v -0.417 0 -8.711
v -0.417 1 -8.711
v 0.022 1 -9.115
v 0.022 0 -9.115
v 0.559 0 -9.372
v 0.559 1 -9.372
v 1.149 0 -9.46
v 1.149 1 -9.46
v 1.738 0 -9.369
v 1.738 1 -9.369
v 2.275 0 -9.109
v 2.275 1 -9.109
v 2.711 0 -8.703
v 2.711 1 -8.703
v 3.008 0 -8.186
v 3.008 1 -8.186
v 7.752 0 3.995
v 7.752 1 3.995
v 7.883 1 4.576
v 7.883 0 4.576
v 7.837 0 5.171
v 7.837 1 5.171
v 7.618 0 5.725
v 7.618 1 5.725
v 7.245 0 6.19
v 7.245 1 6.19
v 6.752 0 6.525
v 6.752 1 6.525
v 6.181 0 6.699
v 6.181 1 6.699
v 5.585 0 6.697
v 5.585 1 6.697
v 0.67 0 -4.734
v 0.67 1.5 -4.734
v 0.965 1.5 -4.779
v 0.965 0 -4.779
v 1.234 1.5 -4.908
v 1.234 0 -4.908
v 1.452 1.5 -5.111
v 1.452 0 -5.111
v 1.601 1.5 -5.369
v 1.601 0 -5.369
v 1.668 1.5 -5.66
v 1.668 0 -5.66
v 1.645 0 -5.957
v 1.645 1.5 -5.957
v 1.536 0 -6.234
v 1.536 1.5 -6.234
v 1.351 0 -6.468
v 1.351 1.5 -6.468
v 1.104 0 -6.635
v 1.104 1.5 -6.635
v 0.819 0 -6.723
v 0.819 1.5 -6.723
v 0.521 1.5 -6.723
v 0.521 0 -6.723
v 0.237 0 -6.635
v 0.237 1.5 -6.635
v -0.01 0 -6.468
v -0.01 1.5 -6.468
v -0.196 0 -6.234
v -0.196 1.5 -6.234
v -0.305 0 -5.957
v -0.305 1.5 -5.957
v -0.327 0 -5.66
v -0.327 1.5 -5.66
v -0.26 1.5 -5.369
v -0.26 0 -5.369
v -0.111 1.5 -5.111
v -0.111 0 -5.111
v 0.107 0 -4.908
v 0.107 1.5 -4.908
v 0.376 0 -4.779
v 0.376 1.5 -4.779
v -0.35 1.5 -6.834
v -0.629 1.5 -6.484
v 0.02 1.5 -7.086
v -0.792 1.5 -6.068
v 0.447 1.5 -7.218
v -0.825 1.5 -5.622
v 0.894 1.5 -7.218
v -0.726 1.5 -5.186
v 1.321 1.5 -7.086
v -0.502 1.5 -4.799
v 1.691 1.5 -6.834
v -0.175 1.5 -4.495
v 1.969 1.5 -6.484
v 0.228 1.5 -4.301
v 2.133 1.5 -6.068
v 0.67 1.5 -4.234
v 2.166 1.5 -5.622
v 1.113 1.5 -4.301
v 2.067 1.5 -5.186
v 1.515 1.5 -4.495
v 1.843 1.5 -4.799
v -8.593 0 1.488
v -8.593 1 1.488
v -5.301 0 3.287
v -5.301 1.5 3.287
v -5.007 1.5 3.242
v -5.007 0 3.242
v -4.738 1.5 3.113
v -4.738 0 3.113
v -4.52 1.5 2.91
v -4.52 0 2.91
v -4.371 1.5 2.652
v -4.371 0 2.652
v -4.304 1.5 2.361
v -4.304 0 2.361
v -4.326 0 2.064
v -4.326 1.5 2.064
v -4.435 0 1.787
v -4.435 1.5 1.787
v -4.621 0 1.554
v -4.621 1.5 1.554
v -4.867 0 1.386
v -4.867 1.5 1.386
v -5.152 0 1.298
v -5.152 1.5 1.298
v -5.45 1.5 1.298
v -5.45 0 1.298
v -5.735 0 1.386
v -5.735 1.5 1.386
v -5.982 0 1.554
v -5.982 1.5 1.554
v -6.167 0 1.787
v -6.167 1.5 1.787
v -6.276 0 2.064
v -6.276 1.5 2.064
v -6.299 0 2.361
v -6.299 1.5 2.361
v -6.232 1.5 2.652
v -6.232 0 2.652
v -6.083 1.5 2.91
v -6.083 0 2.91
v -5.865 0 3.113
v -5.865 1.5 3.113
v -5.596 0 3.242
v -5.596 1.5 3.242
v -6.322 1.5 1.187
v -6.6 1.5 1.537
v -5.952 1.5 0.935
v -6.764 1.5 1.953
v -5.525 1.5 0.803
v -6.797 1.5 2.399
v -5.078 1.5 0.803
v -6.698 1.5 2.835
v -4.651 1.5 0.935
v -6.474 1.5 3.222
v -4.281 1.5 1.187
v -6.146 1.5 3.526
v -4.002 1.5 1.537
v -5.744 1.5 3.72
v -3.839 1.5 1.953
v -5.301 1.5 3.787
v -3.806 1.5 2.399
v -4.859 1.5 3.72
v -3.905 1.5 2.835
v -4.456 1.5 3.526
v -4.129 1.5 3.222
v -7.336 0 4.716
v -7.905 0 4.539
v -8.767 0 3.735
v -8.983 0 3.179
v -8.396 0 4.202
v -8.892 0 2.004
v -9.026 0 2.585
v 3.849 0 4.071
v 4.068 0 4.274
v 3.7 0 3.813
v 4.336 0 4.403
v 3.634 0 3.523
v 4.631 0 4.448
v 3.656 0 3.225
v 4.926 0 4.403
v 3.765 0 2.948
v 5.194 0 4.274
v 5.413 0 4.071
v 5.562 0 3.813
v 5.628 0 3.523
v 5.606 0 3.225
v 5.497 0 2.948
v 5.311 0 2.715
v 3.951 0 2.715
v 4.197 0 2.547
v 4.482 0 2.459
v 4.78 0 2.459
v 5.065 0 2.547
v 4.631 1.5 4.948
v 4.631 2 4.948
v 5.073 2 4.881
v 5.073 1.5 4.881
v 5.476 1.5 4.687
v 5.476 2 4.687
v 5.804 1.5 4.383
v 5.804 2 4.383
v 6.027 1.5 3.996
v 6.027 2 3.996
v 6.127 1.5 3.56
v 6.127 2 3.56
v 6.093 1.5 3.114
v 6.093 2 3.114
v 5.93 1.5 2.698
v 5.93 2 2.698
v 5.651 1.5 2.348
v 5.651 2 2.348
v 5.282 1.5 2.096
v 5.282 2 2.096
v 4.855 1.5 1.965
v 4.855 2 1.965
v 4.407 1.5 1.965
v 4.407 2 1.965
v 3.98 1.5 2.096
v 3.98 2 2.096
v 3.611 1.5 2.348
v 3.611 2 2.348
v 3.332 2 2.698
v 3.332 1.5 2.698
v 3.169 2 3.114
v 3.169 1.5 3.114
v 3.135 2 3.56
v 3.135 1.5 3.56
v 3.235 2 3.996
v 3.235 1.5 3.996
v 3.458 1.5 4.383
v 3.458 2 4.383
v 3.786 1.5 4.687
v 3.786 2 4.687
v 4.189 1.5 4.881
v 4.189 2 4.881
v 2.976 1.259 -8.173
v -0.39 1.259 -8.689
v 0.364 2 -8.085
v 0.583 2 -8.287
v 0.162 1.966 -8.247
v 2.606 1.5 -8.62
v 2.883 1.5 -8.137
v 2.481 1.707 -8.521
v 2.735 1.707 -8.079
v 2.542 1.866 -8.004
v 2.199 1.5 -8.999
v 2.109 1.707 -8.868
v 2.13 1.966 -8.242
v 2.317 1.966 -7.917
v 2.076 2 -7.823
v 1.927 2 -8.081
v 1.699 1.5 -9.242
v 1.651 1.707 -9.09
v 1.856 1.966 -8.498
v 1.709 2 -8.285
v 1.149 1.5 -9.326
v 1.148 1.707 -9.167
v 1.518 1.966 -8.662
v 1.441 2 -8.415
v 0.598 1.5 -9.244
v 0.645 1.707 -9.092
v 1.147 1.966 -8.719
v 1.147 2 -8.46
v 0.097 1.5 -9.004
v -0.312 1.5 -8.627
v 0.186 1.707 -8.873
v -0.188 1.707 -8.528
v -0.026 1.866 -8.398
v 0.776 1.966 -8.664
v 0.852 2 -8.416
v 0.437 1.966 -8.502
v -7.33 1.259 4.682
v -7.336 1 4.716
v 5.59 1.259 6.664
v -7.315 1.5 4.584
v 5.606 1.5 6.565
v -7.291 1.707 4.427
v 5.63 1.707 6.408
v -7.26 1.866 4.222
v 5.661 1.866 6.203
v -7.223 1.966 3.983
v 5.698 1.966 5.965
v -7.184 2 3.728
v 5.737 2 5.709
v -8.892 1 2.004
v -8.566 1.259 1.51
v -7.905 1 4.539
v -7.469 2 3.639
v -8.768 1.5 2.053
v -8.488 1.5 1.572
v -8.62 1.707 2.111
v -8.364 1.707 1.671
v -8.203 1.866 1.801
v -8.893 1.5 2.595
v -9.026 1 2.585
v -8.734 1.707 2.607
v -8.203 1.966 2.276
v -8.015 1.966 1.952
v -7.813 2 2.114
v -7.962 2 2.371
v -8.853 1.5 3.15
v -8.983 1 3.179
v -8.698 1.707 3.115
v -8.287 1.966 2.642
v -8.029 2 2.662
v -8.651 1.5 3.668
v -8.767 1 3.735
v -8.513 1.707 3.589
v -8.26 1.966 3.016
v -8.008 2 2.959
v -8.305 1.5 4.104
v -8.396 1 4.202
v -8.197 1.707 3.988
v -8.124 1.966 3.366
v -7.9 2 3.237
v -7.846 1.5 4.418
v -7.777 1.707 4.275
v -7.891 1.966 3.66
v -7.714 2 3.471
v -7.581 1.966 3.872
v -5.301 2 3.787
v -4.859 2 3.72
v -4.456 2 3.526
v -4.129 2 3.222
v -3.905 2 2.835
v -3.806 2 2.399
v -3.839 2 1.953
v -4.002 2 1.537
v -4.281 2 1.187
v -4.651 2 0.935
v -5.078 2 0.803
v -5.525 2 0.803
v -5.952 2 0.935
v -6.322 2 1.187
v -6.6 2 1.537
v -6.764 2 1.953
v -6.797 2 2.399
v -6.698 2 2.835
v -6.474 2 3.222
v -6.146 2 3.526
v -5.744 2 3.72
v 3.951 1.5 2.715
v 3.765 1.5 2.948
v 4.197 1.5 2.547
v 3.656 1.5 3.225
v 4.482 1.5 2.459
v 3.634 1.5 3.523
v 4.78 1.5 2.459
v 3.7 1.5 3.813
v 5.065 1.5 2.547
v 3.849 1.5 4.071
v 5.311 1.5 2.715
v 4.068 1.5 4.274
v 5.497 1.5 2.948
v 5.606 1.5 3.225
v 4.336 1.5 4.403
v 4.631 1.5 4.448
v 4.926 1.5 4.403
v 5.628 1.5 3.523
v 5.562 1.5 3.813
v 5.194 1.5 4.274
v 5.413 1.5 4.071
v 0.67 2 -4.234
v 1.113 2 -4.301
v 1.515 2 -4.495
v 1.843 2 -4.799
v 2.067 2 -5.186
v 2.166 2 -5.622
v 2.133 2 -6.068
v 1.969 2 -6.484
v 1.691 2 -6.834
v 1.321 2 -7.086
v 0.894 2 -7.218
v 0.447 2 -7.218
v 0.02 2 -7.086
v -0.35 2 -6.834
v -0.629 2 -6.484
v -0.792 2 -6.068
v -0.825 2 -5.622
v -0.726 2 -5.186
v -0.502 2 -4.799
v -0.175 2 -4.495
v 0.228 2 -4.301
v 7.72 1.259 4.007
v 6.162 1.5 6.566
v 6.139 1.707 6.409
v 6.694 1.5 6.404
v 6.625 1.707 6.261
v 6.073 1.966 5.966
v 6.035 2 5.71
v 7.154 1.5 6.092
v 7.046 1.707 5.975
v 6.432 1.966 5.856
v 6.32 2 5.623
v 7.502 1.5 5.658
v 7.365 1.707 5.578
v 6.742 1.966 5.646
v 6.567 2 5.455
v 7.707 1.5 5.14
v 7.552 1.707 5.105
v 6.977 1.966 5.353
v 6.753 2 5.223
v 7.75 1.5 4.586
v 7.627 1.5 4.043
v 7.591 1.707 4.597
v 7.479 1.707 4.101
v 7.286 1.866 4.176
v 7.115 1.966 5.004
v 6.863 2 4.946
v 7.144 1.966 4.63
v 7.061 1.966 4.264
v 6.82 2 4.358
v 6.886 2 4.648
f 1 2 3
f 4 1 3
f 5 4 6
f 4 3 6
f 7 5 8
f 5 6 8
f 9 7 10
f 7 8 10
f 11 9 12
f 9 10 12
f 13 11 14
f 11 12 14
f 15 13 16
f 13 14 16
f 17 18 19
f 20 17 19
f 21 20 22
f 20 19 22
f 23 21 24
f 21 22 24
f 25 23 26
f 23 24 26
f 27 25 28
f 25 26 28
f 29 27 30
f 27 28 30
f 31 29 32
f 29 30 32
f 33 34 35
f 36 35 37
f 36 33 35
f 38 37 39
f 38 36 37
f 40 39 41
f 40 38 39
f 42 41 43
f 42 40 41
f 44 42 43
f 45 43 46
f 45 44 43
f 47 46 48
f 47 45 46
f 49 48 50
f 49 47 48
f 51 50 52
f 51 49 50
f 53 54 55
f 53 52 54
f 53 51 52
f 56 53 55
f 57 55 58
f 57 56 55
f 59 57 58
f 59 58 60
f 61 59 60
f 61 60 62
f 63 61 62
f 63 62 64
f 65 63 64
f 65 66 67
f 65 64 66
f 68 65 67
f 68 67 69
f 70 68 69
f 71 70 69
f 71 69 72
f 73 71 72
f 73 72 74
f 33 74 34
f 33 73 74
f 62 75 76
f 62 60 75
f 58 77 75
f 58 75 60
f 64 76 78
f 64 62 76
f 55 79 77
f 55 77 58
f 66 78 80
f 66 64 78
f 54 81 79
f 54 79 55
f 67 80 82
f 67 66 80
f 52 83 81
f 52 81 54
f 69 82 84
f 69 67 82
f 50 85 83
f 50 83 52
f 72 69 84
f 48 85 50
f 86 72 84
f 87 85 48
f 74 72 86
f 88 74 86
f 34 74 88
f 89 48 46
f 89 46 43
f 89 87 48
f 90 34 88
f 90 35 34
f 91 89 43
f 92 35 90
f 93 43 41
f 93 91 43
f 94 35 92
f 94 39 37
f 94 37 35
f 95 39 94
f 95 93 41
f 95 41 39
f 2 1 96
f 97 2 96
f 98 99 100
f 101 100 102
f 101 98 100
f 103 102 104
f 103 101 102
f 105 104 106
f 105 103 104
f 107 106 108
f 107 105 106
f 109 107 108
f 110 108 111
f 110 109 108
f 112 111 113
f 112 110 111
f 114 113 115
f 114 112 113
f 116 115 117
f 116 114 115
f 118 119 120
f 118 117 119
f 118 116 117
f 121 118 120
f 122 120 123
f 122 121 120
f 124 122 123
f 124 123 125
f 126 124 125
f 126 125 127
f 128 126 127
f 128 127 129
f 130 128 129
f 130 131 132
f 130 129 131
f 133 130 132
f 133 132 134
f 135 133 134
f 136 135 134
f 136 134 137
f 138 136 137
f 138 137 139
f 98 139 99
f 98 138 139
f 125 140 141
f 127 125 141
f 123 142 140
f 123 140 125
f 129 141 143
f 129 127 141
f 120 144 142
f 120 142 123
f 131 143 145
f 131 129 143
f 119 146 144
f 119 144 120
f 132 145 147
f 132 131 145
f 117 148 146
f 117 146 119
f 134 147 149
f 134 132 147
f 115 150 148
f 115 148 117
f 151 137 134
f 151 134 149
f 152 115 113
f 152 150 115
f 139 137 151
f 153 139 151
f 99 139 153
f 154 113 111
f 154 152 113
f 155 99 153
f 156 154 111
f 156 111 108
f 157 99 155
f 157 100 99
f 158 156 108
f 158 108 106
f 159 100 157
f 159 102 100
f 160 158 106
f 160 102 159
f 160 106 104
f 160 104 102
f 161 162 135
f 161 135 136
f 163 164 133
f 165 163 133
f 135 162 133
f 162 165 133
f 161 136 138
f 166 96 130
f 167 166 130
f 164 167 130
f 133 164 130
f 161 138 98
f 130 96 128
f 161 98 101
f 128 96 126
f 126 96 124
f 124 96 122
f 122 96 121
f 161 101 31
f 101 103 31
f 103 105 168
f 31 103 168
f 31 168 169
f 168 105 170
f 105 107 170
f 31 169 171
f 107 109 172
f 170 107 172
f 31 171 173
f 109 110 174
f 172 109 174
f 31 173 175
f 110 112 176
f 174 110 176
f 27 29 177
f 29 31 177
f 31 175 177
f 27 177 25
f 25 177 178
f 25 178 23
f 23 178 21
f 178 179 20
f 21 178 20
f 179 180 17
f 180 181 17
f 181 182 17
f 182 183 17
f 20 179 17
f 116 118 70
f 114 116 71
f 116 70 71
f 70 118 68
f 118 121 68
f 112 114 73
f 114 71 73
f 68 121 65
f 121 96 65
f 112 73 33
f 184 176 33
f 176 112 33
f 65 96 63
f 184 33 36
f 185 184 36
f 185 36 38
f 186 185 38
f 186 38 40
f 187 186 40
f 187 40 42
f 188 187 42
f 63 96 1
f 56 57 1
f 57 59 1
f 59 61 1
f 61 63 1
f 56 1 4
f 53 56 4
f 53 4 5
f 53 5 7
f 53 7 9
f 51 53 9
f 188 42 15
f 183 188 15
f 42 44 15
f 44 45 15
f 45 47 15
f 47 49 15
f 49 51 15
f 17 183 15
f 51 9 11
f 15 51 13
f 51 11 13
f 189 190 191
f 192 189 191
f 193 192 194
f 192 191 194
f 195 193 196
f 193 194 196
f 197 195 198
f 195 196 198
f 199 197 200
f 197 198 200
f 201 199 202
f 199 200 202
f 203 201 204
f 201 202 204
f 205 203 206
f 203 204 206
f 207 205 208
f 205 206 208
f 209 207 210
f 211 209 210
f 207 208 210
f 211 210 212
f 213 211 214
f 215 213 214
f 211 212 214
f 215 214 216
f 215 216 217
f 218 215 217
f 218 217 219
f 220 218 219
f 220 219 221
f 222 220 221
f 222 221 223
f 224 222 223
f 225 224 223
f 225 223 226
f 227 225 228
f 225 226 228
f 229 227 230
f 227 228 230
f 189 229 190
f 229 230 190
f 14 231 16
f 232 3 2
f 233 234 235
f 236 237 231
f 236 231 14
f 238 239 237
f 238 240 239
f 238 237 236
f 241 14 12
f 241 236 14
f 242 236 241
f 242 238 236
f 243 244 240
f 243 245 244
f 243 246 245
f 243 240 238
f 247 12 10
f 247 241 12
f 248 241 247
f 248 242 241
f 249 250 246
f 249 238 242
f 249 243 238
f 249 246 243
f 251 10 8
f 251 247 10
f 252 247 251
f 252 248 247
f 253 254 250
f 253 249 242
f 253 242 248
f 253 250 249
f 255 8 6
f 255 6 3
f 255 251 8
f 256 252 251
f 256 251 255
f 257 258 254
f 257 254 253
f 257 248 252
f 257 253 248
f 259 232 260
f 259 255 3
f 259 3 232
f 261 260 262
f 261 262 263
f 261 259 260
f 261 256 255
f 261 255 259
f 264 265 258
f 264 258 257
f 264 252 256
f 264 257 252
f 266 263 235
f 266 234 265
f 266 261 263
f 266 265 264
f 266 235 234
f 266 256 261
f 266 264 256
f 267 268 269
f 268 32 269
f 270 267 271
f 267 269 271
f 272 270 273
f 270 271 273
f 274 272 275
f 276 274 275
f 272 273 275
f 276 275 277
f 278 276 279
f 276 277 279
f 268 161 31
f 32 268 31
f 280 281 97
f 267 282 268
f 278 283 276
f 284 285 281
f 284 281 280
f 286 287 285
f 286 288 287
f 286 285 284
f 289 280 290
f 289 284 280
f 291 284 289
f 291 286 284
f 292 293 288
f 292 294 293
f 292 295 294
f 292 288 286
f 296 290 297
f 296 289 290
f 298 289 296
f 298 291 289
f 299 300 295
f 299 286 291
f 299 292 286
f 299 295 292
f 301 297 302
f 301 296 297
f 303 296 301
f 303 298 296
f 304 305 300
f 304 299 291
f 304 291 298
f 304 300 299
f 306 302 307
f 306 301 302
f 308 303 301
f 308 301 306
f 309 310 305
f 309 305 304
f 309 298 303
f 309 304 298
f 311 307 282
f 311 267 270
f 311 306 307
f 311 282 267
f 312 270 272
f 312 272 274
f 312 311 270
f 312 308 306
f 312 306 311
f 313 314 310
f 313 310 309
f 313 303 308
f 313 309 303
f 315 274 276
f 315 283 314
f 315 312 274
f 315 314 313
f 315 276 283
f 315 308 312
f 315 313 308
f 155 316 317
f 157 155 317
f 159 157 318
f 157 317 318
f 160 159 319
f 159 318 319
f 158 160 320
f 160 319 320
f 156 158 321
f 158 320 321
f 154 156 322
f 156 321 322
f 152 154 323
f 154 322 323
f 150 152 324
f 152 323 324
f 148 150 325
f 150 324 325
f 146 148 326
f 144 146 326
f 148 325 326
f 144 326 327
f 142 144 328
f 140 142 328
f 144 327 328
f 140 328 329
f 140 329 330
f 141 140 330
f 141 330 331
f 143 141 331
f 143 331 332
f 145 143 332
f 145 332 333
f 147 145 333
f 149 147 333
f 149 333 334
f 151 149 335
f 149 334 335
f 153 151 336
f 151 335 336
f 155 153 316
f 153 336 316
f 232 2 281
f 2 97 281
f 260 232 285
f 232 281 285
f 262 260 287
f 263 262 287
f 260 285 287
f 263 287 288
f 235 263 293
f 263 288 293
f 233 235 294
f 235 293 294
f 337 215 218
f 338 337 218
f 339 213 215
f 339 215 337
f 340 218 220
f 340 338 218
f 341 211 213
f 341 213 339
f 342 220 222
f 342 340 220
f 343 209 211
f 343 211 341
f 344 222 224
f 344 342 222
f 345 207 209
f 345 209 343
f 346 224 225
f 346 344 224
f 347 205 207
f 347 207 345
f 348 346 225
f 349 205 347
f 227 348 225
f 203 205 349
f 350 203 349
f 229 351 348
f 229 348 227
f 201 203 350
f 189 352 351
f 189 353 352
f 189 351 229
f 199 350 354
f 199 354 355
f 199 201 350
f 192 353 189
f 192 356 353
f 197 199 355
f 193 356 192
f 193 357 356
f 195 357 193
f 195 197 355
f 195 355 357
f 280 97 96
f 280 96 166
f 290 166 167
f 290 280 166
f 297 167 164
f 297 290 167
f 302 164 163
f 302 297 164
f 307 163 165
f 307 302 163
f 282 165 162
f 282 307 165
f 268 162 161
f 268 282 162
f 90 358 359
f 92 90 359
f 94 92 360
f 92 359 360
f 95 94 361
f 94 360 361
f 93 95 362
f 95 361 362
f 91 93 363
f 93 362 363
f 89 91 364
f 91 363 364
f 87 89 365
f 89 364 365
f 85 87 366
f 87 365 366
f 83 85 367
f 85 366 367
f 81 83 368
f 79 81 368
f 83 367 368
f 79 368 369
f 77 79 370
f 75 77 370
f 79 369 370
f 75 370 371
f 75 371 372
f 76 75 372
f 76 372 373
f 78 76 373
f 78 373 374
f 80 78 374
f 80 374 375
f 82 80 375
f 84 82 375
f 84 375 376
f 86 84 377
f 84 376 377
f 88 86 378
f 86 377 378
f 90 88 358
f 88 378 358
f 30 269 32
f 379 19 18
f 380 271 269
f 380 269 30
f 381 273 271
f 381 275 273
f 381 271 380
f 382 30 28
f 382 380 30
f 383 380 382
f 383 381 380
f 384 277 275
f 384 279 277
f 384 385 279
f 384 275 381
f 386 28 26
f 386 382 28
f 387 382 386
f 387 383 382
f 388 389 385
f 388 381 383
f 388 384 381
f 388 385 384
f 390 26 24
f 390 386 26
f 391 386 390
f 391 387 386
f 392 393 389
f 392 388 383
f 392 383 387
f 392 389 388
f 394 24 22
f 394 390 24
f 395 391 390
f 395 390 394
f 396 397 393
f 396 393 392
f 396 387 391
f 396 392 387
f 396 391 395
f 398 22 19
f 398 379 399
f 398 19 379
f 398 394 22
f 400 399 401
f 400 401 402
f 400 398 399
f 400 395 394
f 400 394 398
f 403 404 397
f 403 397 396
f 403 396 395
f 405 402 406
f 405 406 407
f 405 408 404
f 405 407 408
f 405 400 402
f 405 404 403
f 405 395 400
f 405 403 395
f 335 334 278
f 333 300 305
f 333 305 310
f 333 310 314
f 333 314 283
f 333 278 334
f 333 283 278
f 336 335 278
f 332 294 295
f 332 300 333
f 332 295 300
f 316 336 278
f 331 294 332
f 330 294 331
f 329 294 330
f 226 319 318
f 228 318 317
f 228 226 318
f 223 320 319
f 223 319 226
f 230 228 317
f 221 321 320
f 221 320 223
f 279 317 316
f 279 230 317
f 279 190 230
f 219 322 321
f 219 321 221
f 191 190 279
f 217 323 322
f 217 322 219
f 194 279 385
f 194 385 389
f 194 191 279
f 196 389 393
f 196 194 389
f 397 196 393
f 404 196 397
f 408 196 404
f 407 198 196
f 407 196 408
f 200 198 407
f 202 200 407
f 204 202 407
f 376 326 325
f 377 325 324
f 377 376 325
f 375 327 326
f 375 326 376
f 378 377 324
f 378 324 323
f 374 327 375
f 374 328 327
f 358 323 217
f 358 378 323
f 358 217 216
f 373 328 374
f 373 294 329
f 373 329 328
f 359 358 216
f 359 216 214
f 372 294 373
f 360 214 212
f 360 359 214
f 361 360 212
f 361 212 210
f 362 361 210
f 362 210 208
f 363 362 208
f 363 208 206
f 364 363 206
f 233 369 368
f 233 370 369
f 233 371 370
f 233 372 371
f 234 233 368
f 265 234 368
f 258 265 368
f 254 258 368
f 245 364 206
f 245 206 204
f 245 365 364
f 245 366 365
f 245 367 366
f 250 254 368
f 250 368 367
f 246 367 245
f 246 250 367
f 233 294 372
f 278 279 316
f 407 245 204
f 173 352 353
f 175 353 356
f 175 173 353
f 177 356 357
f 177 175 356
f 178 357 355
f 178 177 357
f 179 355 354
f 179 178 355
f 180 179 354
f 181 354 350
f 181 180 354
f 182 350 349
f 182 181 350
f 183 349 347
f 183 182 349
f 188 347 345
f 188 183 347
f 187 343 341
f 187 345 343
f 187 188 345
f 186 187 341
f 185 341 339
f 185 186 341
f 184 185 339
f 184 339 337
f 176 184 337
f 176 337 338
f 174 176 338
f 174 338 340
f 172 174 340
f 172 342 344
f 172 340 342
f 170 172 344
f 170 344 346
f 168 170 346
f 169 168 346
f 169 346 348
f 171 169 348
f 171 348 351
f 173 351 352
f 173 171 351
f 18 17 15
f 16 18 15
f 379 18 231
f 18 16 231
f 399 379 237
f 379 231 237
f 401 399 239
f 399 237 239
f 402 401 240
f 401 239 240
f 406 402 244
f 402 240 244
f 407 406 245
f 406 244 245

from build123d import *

# Parameters (mm, degrees)
SKETCH1_R           = 1
BOSS_EXTRUDE1_DEPTH = 2
FILLET1_R           = 2
FILLET2_R           = 1
SKETCH2_R           = 1.5
CUT_EXTRUDE1_DEPTH  = 0.5


with BuildPart() as part:
    # Sketch1 → Boss-Extrude1 (new body)
    with BuildSketch(Plane(origin=(0, 0, 0), x_dir=(1, 0, 0), z_dir=(0, 1, 0))):
        Polygon((1.750249519, 11.413586639), (-10.759580737, -4.191032773), (9.009331218, -7.222553866), align=None)
        with Locations(Location((0.670392162, 5.734449205, 0), (0, 0, 270))):
            Circle(SKETCH1_R, mode=Mode.SUBTRACT)
        with Locations(Location((4.630982607, -3.447801245, 0), (0, 0, 270))):
            Circle(SKETCH1_R, mode=Mode.SUBTRACT)
        with Locations(Location((-5.301374769, -2.28664796, 0), (0, 0, 270))):
            Circle(SKETCH1_R, mode=Mode.SUBTRACT)
    extrude(amount=BOSS_EXTRUDE1_DEPTH)

    # Fillet1
    fillet1_edges = [part.edges().sort_by_distance(p)[0] for p in [
        (9.009331218, 1, 7.222553866),
        (-10.759580737, 1, 4.191032773),
        (1.750249519, 1, -11.413586639),
    ]]
    fillet(fillet1_edges, radius=FILLET1_R)

    # Fillet2
    fillet2_edges = [part.edges().sort_by_distance(p)[0] for p in [
        (-4.504665609, 2, -3.611276933),
        (5.379790368, 2, -2.095516386),
        (-0.875124759, 2, 5.706793319),
        (-8.895966686, 2, 3.465124603),
        (7.448869277, 2, 5.97157084),
        (1.44709741, 2, -9.436695443),
    ]]
    fillet(fillet2_edges, radius=FILLET2_R)

    # Sketch2 → Cut-Extrude1 (cut)
    with BuildSketch(Plane(origin=(0, 2, 0), x_dir=(1, 0, 0), z_dir=(0, 1, 0))):
        with Locations(Location((0.670392162, 5.734449205, 0), (0, 0, 270))):
            Circle(SKETCH2_R)
        with Locations(Location((-5.301374769, -2.28664796, 0), (0, 0, 270))):
            Circle(SKETCH2_R)
        with Locations(Location((4.630982607, -3.447801245, 0), (0, 0, 270))):
            Circle(SKETCH2_R)
    extrude(amount=-CUT_EXTRUDE1_DEPTH, mode=Mode.SUBTRACT)


solid = part.part
